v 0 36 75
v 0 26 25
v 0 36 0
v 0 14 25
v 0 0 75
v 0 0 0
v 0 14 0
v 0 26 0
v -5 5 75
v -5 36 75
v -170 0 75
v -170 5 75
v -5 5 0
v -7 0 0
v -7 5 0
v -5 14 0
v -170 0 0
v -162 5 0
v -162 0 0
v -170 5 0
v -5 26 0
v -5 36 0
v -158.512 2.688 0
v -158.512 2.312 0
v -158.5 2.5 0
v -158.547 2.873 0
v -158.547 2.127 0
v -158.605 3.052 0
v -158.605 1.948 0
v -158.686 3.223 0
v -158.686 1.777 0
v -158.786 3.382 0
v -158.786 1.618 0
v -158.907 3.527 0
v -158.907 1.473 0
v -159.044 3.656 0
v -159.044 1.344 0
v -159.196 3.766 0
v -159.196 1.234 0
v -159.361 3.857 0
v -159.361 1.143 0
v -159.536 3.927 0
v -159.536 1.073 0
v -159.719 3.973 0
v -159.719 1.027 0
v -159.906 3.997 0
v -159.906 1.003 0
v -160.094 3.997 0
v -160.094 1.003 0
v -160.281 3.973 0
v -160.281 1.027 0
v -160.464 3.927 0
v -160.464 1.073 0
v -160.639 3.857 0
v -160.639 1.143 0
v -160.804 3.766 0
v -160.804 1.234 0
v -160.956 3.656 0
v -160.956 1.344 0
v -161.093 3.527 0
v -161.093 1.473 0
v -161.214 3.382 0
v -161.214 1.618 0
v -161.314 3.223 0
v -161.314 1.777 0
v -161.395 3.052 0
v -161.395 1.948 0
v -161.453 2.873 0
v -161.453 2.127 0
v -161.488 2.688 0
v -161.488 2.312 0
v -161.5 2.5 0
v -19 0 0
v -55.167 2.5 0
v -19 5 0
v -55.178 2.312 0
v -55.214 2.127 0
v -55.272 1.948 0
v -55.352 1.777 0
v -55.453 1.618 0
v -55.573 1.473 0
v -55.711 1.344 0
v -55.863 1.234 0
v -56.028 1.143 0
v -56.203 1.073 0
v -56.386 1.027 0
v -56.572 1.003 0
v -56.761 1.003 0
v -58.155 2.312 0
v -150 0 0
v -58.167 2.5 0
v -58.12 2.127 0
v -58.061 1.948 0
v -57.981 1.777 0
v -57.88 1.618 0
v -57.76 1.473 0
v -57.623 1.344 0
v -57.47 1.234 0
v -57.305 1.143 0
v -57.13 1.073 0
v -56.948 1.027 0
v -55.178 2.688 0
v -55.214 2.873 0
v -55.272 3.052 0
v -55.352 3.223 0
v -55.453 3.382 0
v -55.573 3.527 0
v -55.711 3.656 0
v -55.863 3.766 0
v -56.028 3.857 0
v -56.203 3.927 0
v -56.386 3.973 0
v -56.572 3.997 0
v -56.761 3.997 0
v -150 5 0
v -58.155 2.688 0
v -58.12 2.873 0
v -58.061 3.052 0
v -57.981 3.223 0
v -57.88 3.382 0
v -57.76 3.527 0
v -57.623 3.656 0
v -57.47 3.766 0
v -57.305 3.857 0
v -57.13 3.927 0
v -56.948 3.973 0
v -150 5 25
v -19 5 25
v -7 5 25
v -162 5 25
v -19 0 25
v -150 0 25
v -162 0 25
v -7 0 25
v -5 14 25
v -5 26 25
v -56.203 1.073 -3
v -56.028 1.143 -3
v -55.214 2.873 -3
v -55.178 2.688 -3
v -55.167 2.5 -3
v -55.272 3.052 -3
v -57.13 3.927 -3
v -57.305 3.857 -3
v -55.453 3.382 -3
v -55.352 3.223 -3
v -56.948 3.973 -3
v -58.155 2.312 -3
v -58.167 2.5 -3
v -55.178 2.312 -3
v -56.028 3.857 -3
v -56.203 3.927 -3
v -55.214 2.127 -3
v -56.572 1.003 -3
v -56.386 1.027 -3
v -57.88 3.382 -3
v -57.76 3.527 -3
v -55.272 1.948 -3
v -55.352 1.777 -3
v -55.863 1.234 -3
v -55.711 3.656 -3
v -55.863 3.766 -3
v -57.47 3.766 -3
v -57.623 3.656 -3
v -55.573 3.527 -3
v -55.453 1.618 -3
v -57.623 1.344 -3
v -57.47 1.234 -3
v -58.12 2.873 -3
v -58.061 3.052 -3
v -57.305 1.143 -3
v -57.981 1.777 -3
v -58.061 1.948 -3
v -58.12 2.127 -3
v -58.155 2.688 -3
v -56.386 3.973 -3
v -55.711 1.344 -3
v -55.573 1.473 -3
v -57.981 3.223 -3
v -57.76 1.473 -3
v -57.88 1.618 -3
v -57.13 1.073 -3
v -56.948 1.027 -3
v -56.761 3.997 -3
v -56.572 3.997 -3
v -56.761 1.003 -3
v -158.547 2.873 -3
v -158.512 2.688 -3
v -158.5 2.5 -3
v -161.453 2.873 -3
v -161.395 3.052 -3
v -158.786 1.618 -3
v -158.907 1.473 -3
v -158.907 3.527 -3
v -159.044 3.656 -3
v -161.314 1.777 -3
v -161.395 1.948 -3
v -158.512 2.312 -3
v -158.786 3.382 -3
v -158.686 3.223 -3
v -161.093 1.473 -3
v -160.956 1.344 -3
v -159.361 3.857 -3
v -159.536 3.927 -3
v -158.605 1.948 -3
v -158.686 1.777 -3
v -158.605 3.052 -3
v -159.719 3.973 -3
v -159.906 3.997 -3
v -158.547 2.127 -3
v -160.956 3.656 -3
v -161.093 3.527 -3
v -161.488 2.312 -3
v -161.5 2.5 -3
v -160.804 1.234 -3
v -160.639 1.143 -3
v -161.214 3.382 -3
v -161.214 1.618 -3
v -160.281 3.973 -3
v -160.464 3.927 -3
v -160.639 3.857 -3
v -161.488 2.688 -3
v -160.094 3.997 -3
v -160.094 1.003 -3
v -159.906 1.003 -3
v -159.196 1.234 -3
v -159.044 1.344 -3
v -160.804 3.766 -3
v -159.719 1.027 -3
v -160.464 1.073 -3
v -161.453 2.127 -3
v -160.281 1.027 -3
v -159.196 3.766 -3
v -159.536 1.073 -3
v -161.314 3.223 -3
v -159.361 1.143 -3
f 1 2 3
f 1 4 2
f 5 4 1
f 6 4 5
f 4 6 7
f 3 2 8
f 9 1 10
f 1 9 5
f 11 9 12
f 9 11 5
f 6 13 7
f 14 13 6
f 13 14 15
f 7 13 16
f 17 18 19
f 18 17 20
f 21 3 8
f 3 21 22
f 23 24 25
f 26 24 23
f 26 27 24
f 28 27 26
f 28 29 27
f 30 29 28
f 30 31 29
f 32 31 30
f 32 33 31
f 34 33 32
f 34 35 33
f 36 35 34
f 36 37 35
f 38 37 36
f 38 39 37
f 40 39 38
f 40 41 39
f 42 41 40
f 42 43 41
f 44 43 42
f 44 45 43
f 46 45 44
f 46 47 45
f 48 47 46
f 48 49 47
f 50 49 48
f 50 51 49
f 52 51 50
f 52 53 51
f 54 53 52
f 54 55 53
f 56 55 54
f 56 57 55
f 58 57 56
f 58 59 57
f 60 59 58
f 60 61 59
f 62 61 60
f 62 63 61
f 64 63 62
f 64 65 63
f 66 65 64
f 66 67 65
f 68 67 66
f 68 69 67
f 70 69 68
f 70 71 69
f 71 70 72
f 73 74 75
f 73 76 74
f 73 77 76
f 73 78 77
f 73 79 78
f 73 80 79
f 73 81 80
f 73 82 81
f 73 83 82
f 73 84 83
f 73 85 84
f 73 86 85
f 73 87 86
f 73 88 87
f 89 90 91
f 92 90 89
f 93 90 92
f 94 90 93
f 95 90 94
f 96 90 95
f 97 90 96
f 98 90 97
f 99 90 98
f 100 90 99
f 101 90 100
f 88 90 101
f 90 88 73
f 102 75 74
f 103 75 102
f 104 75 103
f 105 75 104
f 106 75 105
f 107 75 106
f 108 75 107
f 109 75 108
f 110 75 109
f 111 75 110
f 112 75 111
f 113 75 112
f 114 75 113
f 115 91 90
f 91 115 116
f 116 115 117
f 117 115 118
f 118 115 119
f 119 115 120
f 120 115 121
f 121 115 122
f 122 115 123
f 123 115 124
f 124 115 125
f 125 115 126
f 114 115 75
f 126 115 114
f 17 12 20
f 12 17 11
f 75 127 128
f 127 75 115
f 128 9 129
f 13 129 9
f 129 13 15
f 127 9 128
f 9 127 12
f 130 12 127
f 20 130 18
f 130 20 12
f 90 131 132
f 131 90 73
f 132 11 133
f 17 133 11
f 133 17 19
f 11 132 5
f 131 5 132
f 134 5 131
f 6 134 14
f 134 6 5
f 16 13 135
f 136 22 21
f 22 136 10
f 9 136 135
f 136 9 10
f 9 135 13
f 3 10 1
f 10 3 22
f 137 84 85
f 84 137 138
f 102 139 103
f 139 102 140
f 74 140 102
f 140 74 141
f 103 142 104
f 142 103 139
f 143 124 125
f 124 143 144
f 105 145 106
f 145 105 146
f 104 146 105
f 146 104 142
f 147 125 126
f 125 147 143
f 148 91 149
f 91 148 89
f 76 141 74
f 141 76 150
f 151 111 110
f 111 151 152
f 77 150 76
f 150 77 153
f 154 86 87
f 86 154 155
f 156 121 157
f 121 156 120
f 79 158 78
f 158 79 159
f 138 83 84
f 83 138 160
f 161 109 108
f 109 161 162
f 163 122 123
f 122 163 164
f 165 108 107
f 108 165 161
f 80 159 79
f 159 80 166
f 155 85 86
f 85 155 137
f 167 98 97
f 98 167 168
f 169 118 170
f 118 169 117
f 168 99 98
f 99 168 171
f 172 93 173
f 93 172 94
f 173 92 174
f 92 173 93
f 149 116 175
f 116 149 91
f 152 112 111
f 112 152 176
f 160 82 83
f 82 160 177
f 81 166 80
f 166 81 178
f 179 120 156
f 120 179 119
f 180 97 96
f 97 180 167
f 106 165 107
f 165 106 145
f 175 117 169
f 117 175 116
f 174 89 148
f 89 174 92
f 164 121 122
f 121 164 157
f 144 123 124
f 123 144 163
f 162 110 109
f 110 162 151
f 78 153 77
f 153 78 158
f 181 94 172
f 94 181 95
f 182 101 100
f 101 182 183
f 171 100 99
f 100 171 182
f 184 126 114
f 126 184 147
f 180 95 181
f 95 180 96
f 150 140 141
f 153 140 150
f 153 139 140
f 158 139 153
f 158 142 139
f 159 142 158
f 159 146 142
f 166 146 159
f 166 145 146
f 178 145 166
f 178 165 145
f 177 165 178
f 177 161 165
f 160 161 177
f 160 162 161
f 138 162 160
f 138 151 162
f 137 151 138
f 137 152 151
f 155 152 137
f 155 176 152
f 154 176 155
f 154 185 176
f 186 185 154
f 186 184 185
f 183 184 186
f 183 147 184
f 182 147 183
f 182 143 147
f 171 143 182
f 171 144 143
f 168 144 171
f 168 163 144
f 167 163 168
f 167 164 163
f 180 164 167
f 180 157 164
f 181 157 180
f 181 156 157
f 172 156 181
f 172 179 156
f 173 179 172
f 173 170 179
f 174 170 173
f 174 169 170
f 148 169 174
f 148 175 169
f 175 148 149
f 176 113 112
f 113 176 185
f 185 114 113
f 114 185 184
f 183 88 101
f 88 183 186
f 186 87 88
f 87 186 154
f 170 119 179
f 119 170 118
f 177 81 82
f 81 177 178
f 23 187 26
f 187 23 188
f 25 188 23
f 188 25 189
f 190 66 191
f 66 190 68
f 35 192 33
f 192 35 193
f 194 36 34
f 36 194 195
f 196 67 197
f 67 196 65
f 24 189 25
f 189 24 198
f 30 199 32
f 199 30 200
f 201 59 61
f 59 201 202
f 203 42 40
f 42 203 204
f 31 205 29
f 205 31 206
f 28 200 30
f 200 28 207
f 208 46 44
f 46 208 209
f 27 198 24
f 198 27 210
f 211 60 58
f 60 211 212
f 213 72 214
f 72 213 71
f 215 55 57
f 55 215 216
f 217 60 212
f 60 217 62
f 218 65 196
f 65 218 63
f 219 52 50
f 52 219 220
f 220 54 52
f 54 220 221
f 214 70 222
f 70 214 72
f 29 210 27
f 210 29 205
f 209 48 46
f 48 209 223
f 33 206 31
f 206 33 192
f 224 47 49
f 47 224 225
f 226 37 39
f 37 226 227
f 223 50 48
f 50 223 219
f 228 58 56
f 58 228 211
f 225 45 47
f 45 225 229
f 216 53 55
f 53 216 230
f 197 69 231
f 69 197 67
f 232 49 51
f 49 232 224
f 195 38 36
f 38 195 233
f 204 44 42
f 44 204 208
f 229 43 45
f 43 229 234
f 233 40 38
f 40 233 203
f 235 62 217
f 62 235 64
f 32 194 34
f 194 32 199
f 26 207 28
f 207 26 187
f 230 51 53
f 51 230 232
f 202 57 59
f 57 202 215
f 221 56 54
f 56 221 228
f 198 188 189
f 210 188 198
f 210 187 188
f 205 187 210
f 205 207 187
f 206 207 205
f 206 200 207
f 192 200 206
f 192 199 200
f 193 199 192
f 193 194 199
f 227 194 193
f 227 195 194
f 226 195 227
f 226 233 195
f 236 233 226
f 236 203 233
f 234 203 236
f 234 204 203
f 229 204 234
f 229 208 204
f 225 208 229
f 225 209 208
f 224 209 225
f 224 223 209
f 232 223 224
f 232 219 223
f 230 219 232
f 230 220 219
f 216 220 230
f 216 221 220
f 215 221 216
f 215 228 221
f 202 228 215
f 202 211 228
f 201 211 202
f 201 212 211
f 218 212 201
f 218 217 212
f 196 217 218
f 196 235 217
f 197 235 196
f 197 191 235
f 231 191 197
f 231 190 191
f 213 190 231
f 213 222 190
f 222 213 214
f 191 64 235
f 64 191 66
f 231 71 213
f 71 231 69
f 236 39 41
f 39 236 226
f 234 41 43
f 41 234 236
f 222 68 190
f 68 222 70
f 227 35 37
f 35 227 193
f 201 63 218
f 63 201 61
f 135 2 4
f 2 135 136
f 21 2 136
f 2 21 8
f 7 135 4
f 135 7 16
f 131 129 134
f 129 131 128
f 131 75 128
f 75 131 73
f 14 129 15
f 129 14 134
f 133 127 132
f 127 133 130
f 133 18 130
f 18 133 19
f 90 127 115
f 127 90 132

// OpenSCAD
//Spessore parete del corridoio, con la porta
spessore_uno=5; 
//lunghezza della prima parete
lunghezza_uno=36; 

//spessore parete divisoria degli ambienti
spessore_due=5;
lunghezza_due = 170; 
//
//altezza uguale per tutte le pareti
altezza=75; 


//dati relativi alla porta
altezza_porta = 25; 
larghezza_porta = 12;
//distanza della porta a partire dall'angolo esterno
distanza_porta = 14;

//parametri relativi alle finestre, ma non ancora inseriti nel modello
lunghezza_fin=15;
 altezza_fin=11;

due_pareti_porta();


//con questa funzione si creano due pareti ad angolo retto
module due_pareti(){
   union(){
   translate([-lunghezza_due,0,0]){ cube([lunghezza_due, spessore_due, altezza]);
   }
   rotate([0,0,90])    cube([lunghezza_uno, spessore_uno, altezza]);
    translate([-lunghezza_due/3,spessore_due/2,-3])cylinder(10, 1.5,1.5, $fn=50);
    translate([-lunghezza_due+10,spessore_due/2,-3])cylinder(10, 1.5,1.5, $fn=50);
   }
}


module due_pareti_porta(){
    
    difference(){
        due_pareti();
        translate([-spessore_due,distanza_porta,0]) cube([spessore_due,larghezza_porta,altezza_porta]);
    
        rotate ([0,0,90])translate([0,7,0]) cube([spessore_due,larghezza_porta,altezza_porta]);
        
        rotate ([0,0,90])translate([0,150,0]) cube([spessore_due,larghezza_porta,altezza_porta]);
     }
}

module finestra(){
    
    cube([lunghezza_fin, spessore, altezza_fin]);
    
    }
    
    
    
